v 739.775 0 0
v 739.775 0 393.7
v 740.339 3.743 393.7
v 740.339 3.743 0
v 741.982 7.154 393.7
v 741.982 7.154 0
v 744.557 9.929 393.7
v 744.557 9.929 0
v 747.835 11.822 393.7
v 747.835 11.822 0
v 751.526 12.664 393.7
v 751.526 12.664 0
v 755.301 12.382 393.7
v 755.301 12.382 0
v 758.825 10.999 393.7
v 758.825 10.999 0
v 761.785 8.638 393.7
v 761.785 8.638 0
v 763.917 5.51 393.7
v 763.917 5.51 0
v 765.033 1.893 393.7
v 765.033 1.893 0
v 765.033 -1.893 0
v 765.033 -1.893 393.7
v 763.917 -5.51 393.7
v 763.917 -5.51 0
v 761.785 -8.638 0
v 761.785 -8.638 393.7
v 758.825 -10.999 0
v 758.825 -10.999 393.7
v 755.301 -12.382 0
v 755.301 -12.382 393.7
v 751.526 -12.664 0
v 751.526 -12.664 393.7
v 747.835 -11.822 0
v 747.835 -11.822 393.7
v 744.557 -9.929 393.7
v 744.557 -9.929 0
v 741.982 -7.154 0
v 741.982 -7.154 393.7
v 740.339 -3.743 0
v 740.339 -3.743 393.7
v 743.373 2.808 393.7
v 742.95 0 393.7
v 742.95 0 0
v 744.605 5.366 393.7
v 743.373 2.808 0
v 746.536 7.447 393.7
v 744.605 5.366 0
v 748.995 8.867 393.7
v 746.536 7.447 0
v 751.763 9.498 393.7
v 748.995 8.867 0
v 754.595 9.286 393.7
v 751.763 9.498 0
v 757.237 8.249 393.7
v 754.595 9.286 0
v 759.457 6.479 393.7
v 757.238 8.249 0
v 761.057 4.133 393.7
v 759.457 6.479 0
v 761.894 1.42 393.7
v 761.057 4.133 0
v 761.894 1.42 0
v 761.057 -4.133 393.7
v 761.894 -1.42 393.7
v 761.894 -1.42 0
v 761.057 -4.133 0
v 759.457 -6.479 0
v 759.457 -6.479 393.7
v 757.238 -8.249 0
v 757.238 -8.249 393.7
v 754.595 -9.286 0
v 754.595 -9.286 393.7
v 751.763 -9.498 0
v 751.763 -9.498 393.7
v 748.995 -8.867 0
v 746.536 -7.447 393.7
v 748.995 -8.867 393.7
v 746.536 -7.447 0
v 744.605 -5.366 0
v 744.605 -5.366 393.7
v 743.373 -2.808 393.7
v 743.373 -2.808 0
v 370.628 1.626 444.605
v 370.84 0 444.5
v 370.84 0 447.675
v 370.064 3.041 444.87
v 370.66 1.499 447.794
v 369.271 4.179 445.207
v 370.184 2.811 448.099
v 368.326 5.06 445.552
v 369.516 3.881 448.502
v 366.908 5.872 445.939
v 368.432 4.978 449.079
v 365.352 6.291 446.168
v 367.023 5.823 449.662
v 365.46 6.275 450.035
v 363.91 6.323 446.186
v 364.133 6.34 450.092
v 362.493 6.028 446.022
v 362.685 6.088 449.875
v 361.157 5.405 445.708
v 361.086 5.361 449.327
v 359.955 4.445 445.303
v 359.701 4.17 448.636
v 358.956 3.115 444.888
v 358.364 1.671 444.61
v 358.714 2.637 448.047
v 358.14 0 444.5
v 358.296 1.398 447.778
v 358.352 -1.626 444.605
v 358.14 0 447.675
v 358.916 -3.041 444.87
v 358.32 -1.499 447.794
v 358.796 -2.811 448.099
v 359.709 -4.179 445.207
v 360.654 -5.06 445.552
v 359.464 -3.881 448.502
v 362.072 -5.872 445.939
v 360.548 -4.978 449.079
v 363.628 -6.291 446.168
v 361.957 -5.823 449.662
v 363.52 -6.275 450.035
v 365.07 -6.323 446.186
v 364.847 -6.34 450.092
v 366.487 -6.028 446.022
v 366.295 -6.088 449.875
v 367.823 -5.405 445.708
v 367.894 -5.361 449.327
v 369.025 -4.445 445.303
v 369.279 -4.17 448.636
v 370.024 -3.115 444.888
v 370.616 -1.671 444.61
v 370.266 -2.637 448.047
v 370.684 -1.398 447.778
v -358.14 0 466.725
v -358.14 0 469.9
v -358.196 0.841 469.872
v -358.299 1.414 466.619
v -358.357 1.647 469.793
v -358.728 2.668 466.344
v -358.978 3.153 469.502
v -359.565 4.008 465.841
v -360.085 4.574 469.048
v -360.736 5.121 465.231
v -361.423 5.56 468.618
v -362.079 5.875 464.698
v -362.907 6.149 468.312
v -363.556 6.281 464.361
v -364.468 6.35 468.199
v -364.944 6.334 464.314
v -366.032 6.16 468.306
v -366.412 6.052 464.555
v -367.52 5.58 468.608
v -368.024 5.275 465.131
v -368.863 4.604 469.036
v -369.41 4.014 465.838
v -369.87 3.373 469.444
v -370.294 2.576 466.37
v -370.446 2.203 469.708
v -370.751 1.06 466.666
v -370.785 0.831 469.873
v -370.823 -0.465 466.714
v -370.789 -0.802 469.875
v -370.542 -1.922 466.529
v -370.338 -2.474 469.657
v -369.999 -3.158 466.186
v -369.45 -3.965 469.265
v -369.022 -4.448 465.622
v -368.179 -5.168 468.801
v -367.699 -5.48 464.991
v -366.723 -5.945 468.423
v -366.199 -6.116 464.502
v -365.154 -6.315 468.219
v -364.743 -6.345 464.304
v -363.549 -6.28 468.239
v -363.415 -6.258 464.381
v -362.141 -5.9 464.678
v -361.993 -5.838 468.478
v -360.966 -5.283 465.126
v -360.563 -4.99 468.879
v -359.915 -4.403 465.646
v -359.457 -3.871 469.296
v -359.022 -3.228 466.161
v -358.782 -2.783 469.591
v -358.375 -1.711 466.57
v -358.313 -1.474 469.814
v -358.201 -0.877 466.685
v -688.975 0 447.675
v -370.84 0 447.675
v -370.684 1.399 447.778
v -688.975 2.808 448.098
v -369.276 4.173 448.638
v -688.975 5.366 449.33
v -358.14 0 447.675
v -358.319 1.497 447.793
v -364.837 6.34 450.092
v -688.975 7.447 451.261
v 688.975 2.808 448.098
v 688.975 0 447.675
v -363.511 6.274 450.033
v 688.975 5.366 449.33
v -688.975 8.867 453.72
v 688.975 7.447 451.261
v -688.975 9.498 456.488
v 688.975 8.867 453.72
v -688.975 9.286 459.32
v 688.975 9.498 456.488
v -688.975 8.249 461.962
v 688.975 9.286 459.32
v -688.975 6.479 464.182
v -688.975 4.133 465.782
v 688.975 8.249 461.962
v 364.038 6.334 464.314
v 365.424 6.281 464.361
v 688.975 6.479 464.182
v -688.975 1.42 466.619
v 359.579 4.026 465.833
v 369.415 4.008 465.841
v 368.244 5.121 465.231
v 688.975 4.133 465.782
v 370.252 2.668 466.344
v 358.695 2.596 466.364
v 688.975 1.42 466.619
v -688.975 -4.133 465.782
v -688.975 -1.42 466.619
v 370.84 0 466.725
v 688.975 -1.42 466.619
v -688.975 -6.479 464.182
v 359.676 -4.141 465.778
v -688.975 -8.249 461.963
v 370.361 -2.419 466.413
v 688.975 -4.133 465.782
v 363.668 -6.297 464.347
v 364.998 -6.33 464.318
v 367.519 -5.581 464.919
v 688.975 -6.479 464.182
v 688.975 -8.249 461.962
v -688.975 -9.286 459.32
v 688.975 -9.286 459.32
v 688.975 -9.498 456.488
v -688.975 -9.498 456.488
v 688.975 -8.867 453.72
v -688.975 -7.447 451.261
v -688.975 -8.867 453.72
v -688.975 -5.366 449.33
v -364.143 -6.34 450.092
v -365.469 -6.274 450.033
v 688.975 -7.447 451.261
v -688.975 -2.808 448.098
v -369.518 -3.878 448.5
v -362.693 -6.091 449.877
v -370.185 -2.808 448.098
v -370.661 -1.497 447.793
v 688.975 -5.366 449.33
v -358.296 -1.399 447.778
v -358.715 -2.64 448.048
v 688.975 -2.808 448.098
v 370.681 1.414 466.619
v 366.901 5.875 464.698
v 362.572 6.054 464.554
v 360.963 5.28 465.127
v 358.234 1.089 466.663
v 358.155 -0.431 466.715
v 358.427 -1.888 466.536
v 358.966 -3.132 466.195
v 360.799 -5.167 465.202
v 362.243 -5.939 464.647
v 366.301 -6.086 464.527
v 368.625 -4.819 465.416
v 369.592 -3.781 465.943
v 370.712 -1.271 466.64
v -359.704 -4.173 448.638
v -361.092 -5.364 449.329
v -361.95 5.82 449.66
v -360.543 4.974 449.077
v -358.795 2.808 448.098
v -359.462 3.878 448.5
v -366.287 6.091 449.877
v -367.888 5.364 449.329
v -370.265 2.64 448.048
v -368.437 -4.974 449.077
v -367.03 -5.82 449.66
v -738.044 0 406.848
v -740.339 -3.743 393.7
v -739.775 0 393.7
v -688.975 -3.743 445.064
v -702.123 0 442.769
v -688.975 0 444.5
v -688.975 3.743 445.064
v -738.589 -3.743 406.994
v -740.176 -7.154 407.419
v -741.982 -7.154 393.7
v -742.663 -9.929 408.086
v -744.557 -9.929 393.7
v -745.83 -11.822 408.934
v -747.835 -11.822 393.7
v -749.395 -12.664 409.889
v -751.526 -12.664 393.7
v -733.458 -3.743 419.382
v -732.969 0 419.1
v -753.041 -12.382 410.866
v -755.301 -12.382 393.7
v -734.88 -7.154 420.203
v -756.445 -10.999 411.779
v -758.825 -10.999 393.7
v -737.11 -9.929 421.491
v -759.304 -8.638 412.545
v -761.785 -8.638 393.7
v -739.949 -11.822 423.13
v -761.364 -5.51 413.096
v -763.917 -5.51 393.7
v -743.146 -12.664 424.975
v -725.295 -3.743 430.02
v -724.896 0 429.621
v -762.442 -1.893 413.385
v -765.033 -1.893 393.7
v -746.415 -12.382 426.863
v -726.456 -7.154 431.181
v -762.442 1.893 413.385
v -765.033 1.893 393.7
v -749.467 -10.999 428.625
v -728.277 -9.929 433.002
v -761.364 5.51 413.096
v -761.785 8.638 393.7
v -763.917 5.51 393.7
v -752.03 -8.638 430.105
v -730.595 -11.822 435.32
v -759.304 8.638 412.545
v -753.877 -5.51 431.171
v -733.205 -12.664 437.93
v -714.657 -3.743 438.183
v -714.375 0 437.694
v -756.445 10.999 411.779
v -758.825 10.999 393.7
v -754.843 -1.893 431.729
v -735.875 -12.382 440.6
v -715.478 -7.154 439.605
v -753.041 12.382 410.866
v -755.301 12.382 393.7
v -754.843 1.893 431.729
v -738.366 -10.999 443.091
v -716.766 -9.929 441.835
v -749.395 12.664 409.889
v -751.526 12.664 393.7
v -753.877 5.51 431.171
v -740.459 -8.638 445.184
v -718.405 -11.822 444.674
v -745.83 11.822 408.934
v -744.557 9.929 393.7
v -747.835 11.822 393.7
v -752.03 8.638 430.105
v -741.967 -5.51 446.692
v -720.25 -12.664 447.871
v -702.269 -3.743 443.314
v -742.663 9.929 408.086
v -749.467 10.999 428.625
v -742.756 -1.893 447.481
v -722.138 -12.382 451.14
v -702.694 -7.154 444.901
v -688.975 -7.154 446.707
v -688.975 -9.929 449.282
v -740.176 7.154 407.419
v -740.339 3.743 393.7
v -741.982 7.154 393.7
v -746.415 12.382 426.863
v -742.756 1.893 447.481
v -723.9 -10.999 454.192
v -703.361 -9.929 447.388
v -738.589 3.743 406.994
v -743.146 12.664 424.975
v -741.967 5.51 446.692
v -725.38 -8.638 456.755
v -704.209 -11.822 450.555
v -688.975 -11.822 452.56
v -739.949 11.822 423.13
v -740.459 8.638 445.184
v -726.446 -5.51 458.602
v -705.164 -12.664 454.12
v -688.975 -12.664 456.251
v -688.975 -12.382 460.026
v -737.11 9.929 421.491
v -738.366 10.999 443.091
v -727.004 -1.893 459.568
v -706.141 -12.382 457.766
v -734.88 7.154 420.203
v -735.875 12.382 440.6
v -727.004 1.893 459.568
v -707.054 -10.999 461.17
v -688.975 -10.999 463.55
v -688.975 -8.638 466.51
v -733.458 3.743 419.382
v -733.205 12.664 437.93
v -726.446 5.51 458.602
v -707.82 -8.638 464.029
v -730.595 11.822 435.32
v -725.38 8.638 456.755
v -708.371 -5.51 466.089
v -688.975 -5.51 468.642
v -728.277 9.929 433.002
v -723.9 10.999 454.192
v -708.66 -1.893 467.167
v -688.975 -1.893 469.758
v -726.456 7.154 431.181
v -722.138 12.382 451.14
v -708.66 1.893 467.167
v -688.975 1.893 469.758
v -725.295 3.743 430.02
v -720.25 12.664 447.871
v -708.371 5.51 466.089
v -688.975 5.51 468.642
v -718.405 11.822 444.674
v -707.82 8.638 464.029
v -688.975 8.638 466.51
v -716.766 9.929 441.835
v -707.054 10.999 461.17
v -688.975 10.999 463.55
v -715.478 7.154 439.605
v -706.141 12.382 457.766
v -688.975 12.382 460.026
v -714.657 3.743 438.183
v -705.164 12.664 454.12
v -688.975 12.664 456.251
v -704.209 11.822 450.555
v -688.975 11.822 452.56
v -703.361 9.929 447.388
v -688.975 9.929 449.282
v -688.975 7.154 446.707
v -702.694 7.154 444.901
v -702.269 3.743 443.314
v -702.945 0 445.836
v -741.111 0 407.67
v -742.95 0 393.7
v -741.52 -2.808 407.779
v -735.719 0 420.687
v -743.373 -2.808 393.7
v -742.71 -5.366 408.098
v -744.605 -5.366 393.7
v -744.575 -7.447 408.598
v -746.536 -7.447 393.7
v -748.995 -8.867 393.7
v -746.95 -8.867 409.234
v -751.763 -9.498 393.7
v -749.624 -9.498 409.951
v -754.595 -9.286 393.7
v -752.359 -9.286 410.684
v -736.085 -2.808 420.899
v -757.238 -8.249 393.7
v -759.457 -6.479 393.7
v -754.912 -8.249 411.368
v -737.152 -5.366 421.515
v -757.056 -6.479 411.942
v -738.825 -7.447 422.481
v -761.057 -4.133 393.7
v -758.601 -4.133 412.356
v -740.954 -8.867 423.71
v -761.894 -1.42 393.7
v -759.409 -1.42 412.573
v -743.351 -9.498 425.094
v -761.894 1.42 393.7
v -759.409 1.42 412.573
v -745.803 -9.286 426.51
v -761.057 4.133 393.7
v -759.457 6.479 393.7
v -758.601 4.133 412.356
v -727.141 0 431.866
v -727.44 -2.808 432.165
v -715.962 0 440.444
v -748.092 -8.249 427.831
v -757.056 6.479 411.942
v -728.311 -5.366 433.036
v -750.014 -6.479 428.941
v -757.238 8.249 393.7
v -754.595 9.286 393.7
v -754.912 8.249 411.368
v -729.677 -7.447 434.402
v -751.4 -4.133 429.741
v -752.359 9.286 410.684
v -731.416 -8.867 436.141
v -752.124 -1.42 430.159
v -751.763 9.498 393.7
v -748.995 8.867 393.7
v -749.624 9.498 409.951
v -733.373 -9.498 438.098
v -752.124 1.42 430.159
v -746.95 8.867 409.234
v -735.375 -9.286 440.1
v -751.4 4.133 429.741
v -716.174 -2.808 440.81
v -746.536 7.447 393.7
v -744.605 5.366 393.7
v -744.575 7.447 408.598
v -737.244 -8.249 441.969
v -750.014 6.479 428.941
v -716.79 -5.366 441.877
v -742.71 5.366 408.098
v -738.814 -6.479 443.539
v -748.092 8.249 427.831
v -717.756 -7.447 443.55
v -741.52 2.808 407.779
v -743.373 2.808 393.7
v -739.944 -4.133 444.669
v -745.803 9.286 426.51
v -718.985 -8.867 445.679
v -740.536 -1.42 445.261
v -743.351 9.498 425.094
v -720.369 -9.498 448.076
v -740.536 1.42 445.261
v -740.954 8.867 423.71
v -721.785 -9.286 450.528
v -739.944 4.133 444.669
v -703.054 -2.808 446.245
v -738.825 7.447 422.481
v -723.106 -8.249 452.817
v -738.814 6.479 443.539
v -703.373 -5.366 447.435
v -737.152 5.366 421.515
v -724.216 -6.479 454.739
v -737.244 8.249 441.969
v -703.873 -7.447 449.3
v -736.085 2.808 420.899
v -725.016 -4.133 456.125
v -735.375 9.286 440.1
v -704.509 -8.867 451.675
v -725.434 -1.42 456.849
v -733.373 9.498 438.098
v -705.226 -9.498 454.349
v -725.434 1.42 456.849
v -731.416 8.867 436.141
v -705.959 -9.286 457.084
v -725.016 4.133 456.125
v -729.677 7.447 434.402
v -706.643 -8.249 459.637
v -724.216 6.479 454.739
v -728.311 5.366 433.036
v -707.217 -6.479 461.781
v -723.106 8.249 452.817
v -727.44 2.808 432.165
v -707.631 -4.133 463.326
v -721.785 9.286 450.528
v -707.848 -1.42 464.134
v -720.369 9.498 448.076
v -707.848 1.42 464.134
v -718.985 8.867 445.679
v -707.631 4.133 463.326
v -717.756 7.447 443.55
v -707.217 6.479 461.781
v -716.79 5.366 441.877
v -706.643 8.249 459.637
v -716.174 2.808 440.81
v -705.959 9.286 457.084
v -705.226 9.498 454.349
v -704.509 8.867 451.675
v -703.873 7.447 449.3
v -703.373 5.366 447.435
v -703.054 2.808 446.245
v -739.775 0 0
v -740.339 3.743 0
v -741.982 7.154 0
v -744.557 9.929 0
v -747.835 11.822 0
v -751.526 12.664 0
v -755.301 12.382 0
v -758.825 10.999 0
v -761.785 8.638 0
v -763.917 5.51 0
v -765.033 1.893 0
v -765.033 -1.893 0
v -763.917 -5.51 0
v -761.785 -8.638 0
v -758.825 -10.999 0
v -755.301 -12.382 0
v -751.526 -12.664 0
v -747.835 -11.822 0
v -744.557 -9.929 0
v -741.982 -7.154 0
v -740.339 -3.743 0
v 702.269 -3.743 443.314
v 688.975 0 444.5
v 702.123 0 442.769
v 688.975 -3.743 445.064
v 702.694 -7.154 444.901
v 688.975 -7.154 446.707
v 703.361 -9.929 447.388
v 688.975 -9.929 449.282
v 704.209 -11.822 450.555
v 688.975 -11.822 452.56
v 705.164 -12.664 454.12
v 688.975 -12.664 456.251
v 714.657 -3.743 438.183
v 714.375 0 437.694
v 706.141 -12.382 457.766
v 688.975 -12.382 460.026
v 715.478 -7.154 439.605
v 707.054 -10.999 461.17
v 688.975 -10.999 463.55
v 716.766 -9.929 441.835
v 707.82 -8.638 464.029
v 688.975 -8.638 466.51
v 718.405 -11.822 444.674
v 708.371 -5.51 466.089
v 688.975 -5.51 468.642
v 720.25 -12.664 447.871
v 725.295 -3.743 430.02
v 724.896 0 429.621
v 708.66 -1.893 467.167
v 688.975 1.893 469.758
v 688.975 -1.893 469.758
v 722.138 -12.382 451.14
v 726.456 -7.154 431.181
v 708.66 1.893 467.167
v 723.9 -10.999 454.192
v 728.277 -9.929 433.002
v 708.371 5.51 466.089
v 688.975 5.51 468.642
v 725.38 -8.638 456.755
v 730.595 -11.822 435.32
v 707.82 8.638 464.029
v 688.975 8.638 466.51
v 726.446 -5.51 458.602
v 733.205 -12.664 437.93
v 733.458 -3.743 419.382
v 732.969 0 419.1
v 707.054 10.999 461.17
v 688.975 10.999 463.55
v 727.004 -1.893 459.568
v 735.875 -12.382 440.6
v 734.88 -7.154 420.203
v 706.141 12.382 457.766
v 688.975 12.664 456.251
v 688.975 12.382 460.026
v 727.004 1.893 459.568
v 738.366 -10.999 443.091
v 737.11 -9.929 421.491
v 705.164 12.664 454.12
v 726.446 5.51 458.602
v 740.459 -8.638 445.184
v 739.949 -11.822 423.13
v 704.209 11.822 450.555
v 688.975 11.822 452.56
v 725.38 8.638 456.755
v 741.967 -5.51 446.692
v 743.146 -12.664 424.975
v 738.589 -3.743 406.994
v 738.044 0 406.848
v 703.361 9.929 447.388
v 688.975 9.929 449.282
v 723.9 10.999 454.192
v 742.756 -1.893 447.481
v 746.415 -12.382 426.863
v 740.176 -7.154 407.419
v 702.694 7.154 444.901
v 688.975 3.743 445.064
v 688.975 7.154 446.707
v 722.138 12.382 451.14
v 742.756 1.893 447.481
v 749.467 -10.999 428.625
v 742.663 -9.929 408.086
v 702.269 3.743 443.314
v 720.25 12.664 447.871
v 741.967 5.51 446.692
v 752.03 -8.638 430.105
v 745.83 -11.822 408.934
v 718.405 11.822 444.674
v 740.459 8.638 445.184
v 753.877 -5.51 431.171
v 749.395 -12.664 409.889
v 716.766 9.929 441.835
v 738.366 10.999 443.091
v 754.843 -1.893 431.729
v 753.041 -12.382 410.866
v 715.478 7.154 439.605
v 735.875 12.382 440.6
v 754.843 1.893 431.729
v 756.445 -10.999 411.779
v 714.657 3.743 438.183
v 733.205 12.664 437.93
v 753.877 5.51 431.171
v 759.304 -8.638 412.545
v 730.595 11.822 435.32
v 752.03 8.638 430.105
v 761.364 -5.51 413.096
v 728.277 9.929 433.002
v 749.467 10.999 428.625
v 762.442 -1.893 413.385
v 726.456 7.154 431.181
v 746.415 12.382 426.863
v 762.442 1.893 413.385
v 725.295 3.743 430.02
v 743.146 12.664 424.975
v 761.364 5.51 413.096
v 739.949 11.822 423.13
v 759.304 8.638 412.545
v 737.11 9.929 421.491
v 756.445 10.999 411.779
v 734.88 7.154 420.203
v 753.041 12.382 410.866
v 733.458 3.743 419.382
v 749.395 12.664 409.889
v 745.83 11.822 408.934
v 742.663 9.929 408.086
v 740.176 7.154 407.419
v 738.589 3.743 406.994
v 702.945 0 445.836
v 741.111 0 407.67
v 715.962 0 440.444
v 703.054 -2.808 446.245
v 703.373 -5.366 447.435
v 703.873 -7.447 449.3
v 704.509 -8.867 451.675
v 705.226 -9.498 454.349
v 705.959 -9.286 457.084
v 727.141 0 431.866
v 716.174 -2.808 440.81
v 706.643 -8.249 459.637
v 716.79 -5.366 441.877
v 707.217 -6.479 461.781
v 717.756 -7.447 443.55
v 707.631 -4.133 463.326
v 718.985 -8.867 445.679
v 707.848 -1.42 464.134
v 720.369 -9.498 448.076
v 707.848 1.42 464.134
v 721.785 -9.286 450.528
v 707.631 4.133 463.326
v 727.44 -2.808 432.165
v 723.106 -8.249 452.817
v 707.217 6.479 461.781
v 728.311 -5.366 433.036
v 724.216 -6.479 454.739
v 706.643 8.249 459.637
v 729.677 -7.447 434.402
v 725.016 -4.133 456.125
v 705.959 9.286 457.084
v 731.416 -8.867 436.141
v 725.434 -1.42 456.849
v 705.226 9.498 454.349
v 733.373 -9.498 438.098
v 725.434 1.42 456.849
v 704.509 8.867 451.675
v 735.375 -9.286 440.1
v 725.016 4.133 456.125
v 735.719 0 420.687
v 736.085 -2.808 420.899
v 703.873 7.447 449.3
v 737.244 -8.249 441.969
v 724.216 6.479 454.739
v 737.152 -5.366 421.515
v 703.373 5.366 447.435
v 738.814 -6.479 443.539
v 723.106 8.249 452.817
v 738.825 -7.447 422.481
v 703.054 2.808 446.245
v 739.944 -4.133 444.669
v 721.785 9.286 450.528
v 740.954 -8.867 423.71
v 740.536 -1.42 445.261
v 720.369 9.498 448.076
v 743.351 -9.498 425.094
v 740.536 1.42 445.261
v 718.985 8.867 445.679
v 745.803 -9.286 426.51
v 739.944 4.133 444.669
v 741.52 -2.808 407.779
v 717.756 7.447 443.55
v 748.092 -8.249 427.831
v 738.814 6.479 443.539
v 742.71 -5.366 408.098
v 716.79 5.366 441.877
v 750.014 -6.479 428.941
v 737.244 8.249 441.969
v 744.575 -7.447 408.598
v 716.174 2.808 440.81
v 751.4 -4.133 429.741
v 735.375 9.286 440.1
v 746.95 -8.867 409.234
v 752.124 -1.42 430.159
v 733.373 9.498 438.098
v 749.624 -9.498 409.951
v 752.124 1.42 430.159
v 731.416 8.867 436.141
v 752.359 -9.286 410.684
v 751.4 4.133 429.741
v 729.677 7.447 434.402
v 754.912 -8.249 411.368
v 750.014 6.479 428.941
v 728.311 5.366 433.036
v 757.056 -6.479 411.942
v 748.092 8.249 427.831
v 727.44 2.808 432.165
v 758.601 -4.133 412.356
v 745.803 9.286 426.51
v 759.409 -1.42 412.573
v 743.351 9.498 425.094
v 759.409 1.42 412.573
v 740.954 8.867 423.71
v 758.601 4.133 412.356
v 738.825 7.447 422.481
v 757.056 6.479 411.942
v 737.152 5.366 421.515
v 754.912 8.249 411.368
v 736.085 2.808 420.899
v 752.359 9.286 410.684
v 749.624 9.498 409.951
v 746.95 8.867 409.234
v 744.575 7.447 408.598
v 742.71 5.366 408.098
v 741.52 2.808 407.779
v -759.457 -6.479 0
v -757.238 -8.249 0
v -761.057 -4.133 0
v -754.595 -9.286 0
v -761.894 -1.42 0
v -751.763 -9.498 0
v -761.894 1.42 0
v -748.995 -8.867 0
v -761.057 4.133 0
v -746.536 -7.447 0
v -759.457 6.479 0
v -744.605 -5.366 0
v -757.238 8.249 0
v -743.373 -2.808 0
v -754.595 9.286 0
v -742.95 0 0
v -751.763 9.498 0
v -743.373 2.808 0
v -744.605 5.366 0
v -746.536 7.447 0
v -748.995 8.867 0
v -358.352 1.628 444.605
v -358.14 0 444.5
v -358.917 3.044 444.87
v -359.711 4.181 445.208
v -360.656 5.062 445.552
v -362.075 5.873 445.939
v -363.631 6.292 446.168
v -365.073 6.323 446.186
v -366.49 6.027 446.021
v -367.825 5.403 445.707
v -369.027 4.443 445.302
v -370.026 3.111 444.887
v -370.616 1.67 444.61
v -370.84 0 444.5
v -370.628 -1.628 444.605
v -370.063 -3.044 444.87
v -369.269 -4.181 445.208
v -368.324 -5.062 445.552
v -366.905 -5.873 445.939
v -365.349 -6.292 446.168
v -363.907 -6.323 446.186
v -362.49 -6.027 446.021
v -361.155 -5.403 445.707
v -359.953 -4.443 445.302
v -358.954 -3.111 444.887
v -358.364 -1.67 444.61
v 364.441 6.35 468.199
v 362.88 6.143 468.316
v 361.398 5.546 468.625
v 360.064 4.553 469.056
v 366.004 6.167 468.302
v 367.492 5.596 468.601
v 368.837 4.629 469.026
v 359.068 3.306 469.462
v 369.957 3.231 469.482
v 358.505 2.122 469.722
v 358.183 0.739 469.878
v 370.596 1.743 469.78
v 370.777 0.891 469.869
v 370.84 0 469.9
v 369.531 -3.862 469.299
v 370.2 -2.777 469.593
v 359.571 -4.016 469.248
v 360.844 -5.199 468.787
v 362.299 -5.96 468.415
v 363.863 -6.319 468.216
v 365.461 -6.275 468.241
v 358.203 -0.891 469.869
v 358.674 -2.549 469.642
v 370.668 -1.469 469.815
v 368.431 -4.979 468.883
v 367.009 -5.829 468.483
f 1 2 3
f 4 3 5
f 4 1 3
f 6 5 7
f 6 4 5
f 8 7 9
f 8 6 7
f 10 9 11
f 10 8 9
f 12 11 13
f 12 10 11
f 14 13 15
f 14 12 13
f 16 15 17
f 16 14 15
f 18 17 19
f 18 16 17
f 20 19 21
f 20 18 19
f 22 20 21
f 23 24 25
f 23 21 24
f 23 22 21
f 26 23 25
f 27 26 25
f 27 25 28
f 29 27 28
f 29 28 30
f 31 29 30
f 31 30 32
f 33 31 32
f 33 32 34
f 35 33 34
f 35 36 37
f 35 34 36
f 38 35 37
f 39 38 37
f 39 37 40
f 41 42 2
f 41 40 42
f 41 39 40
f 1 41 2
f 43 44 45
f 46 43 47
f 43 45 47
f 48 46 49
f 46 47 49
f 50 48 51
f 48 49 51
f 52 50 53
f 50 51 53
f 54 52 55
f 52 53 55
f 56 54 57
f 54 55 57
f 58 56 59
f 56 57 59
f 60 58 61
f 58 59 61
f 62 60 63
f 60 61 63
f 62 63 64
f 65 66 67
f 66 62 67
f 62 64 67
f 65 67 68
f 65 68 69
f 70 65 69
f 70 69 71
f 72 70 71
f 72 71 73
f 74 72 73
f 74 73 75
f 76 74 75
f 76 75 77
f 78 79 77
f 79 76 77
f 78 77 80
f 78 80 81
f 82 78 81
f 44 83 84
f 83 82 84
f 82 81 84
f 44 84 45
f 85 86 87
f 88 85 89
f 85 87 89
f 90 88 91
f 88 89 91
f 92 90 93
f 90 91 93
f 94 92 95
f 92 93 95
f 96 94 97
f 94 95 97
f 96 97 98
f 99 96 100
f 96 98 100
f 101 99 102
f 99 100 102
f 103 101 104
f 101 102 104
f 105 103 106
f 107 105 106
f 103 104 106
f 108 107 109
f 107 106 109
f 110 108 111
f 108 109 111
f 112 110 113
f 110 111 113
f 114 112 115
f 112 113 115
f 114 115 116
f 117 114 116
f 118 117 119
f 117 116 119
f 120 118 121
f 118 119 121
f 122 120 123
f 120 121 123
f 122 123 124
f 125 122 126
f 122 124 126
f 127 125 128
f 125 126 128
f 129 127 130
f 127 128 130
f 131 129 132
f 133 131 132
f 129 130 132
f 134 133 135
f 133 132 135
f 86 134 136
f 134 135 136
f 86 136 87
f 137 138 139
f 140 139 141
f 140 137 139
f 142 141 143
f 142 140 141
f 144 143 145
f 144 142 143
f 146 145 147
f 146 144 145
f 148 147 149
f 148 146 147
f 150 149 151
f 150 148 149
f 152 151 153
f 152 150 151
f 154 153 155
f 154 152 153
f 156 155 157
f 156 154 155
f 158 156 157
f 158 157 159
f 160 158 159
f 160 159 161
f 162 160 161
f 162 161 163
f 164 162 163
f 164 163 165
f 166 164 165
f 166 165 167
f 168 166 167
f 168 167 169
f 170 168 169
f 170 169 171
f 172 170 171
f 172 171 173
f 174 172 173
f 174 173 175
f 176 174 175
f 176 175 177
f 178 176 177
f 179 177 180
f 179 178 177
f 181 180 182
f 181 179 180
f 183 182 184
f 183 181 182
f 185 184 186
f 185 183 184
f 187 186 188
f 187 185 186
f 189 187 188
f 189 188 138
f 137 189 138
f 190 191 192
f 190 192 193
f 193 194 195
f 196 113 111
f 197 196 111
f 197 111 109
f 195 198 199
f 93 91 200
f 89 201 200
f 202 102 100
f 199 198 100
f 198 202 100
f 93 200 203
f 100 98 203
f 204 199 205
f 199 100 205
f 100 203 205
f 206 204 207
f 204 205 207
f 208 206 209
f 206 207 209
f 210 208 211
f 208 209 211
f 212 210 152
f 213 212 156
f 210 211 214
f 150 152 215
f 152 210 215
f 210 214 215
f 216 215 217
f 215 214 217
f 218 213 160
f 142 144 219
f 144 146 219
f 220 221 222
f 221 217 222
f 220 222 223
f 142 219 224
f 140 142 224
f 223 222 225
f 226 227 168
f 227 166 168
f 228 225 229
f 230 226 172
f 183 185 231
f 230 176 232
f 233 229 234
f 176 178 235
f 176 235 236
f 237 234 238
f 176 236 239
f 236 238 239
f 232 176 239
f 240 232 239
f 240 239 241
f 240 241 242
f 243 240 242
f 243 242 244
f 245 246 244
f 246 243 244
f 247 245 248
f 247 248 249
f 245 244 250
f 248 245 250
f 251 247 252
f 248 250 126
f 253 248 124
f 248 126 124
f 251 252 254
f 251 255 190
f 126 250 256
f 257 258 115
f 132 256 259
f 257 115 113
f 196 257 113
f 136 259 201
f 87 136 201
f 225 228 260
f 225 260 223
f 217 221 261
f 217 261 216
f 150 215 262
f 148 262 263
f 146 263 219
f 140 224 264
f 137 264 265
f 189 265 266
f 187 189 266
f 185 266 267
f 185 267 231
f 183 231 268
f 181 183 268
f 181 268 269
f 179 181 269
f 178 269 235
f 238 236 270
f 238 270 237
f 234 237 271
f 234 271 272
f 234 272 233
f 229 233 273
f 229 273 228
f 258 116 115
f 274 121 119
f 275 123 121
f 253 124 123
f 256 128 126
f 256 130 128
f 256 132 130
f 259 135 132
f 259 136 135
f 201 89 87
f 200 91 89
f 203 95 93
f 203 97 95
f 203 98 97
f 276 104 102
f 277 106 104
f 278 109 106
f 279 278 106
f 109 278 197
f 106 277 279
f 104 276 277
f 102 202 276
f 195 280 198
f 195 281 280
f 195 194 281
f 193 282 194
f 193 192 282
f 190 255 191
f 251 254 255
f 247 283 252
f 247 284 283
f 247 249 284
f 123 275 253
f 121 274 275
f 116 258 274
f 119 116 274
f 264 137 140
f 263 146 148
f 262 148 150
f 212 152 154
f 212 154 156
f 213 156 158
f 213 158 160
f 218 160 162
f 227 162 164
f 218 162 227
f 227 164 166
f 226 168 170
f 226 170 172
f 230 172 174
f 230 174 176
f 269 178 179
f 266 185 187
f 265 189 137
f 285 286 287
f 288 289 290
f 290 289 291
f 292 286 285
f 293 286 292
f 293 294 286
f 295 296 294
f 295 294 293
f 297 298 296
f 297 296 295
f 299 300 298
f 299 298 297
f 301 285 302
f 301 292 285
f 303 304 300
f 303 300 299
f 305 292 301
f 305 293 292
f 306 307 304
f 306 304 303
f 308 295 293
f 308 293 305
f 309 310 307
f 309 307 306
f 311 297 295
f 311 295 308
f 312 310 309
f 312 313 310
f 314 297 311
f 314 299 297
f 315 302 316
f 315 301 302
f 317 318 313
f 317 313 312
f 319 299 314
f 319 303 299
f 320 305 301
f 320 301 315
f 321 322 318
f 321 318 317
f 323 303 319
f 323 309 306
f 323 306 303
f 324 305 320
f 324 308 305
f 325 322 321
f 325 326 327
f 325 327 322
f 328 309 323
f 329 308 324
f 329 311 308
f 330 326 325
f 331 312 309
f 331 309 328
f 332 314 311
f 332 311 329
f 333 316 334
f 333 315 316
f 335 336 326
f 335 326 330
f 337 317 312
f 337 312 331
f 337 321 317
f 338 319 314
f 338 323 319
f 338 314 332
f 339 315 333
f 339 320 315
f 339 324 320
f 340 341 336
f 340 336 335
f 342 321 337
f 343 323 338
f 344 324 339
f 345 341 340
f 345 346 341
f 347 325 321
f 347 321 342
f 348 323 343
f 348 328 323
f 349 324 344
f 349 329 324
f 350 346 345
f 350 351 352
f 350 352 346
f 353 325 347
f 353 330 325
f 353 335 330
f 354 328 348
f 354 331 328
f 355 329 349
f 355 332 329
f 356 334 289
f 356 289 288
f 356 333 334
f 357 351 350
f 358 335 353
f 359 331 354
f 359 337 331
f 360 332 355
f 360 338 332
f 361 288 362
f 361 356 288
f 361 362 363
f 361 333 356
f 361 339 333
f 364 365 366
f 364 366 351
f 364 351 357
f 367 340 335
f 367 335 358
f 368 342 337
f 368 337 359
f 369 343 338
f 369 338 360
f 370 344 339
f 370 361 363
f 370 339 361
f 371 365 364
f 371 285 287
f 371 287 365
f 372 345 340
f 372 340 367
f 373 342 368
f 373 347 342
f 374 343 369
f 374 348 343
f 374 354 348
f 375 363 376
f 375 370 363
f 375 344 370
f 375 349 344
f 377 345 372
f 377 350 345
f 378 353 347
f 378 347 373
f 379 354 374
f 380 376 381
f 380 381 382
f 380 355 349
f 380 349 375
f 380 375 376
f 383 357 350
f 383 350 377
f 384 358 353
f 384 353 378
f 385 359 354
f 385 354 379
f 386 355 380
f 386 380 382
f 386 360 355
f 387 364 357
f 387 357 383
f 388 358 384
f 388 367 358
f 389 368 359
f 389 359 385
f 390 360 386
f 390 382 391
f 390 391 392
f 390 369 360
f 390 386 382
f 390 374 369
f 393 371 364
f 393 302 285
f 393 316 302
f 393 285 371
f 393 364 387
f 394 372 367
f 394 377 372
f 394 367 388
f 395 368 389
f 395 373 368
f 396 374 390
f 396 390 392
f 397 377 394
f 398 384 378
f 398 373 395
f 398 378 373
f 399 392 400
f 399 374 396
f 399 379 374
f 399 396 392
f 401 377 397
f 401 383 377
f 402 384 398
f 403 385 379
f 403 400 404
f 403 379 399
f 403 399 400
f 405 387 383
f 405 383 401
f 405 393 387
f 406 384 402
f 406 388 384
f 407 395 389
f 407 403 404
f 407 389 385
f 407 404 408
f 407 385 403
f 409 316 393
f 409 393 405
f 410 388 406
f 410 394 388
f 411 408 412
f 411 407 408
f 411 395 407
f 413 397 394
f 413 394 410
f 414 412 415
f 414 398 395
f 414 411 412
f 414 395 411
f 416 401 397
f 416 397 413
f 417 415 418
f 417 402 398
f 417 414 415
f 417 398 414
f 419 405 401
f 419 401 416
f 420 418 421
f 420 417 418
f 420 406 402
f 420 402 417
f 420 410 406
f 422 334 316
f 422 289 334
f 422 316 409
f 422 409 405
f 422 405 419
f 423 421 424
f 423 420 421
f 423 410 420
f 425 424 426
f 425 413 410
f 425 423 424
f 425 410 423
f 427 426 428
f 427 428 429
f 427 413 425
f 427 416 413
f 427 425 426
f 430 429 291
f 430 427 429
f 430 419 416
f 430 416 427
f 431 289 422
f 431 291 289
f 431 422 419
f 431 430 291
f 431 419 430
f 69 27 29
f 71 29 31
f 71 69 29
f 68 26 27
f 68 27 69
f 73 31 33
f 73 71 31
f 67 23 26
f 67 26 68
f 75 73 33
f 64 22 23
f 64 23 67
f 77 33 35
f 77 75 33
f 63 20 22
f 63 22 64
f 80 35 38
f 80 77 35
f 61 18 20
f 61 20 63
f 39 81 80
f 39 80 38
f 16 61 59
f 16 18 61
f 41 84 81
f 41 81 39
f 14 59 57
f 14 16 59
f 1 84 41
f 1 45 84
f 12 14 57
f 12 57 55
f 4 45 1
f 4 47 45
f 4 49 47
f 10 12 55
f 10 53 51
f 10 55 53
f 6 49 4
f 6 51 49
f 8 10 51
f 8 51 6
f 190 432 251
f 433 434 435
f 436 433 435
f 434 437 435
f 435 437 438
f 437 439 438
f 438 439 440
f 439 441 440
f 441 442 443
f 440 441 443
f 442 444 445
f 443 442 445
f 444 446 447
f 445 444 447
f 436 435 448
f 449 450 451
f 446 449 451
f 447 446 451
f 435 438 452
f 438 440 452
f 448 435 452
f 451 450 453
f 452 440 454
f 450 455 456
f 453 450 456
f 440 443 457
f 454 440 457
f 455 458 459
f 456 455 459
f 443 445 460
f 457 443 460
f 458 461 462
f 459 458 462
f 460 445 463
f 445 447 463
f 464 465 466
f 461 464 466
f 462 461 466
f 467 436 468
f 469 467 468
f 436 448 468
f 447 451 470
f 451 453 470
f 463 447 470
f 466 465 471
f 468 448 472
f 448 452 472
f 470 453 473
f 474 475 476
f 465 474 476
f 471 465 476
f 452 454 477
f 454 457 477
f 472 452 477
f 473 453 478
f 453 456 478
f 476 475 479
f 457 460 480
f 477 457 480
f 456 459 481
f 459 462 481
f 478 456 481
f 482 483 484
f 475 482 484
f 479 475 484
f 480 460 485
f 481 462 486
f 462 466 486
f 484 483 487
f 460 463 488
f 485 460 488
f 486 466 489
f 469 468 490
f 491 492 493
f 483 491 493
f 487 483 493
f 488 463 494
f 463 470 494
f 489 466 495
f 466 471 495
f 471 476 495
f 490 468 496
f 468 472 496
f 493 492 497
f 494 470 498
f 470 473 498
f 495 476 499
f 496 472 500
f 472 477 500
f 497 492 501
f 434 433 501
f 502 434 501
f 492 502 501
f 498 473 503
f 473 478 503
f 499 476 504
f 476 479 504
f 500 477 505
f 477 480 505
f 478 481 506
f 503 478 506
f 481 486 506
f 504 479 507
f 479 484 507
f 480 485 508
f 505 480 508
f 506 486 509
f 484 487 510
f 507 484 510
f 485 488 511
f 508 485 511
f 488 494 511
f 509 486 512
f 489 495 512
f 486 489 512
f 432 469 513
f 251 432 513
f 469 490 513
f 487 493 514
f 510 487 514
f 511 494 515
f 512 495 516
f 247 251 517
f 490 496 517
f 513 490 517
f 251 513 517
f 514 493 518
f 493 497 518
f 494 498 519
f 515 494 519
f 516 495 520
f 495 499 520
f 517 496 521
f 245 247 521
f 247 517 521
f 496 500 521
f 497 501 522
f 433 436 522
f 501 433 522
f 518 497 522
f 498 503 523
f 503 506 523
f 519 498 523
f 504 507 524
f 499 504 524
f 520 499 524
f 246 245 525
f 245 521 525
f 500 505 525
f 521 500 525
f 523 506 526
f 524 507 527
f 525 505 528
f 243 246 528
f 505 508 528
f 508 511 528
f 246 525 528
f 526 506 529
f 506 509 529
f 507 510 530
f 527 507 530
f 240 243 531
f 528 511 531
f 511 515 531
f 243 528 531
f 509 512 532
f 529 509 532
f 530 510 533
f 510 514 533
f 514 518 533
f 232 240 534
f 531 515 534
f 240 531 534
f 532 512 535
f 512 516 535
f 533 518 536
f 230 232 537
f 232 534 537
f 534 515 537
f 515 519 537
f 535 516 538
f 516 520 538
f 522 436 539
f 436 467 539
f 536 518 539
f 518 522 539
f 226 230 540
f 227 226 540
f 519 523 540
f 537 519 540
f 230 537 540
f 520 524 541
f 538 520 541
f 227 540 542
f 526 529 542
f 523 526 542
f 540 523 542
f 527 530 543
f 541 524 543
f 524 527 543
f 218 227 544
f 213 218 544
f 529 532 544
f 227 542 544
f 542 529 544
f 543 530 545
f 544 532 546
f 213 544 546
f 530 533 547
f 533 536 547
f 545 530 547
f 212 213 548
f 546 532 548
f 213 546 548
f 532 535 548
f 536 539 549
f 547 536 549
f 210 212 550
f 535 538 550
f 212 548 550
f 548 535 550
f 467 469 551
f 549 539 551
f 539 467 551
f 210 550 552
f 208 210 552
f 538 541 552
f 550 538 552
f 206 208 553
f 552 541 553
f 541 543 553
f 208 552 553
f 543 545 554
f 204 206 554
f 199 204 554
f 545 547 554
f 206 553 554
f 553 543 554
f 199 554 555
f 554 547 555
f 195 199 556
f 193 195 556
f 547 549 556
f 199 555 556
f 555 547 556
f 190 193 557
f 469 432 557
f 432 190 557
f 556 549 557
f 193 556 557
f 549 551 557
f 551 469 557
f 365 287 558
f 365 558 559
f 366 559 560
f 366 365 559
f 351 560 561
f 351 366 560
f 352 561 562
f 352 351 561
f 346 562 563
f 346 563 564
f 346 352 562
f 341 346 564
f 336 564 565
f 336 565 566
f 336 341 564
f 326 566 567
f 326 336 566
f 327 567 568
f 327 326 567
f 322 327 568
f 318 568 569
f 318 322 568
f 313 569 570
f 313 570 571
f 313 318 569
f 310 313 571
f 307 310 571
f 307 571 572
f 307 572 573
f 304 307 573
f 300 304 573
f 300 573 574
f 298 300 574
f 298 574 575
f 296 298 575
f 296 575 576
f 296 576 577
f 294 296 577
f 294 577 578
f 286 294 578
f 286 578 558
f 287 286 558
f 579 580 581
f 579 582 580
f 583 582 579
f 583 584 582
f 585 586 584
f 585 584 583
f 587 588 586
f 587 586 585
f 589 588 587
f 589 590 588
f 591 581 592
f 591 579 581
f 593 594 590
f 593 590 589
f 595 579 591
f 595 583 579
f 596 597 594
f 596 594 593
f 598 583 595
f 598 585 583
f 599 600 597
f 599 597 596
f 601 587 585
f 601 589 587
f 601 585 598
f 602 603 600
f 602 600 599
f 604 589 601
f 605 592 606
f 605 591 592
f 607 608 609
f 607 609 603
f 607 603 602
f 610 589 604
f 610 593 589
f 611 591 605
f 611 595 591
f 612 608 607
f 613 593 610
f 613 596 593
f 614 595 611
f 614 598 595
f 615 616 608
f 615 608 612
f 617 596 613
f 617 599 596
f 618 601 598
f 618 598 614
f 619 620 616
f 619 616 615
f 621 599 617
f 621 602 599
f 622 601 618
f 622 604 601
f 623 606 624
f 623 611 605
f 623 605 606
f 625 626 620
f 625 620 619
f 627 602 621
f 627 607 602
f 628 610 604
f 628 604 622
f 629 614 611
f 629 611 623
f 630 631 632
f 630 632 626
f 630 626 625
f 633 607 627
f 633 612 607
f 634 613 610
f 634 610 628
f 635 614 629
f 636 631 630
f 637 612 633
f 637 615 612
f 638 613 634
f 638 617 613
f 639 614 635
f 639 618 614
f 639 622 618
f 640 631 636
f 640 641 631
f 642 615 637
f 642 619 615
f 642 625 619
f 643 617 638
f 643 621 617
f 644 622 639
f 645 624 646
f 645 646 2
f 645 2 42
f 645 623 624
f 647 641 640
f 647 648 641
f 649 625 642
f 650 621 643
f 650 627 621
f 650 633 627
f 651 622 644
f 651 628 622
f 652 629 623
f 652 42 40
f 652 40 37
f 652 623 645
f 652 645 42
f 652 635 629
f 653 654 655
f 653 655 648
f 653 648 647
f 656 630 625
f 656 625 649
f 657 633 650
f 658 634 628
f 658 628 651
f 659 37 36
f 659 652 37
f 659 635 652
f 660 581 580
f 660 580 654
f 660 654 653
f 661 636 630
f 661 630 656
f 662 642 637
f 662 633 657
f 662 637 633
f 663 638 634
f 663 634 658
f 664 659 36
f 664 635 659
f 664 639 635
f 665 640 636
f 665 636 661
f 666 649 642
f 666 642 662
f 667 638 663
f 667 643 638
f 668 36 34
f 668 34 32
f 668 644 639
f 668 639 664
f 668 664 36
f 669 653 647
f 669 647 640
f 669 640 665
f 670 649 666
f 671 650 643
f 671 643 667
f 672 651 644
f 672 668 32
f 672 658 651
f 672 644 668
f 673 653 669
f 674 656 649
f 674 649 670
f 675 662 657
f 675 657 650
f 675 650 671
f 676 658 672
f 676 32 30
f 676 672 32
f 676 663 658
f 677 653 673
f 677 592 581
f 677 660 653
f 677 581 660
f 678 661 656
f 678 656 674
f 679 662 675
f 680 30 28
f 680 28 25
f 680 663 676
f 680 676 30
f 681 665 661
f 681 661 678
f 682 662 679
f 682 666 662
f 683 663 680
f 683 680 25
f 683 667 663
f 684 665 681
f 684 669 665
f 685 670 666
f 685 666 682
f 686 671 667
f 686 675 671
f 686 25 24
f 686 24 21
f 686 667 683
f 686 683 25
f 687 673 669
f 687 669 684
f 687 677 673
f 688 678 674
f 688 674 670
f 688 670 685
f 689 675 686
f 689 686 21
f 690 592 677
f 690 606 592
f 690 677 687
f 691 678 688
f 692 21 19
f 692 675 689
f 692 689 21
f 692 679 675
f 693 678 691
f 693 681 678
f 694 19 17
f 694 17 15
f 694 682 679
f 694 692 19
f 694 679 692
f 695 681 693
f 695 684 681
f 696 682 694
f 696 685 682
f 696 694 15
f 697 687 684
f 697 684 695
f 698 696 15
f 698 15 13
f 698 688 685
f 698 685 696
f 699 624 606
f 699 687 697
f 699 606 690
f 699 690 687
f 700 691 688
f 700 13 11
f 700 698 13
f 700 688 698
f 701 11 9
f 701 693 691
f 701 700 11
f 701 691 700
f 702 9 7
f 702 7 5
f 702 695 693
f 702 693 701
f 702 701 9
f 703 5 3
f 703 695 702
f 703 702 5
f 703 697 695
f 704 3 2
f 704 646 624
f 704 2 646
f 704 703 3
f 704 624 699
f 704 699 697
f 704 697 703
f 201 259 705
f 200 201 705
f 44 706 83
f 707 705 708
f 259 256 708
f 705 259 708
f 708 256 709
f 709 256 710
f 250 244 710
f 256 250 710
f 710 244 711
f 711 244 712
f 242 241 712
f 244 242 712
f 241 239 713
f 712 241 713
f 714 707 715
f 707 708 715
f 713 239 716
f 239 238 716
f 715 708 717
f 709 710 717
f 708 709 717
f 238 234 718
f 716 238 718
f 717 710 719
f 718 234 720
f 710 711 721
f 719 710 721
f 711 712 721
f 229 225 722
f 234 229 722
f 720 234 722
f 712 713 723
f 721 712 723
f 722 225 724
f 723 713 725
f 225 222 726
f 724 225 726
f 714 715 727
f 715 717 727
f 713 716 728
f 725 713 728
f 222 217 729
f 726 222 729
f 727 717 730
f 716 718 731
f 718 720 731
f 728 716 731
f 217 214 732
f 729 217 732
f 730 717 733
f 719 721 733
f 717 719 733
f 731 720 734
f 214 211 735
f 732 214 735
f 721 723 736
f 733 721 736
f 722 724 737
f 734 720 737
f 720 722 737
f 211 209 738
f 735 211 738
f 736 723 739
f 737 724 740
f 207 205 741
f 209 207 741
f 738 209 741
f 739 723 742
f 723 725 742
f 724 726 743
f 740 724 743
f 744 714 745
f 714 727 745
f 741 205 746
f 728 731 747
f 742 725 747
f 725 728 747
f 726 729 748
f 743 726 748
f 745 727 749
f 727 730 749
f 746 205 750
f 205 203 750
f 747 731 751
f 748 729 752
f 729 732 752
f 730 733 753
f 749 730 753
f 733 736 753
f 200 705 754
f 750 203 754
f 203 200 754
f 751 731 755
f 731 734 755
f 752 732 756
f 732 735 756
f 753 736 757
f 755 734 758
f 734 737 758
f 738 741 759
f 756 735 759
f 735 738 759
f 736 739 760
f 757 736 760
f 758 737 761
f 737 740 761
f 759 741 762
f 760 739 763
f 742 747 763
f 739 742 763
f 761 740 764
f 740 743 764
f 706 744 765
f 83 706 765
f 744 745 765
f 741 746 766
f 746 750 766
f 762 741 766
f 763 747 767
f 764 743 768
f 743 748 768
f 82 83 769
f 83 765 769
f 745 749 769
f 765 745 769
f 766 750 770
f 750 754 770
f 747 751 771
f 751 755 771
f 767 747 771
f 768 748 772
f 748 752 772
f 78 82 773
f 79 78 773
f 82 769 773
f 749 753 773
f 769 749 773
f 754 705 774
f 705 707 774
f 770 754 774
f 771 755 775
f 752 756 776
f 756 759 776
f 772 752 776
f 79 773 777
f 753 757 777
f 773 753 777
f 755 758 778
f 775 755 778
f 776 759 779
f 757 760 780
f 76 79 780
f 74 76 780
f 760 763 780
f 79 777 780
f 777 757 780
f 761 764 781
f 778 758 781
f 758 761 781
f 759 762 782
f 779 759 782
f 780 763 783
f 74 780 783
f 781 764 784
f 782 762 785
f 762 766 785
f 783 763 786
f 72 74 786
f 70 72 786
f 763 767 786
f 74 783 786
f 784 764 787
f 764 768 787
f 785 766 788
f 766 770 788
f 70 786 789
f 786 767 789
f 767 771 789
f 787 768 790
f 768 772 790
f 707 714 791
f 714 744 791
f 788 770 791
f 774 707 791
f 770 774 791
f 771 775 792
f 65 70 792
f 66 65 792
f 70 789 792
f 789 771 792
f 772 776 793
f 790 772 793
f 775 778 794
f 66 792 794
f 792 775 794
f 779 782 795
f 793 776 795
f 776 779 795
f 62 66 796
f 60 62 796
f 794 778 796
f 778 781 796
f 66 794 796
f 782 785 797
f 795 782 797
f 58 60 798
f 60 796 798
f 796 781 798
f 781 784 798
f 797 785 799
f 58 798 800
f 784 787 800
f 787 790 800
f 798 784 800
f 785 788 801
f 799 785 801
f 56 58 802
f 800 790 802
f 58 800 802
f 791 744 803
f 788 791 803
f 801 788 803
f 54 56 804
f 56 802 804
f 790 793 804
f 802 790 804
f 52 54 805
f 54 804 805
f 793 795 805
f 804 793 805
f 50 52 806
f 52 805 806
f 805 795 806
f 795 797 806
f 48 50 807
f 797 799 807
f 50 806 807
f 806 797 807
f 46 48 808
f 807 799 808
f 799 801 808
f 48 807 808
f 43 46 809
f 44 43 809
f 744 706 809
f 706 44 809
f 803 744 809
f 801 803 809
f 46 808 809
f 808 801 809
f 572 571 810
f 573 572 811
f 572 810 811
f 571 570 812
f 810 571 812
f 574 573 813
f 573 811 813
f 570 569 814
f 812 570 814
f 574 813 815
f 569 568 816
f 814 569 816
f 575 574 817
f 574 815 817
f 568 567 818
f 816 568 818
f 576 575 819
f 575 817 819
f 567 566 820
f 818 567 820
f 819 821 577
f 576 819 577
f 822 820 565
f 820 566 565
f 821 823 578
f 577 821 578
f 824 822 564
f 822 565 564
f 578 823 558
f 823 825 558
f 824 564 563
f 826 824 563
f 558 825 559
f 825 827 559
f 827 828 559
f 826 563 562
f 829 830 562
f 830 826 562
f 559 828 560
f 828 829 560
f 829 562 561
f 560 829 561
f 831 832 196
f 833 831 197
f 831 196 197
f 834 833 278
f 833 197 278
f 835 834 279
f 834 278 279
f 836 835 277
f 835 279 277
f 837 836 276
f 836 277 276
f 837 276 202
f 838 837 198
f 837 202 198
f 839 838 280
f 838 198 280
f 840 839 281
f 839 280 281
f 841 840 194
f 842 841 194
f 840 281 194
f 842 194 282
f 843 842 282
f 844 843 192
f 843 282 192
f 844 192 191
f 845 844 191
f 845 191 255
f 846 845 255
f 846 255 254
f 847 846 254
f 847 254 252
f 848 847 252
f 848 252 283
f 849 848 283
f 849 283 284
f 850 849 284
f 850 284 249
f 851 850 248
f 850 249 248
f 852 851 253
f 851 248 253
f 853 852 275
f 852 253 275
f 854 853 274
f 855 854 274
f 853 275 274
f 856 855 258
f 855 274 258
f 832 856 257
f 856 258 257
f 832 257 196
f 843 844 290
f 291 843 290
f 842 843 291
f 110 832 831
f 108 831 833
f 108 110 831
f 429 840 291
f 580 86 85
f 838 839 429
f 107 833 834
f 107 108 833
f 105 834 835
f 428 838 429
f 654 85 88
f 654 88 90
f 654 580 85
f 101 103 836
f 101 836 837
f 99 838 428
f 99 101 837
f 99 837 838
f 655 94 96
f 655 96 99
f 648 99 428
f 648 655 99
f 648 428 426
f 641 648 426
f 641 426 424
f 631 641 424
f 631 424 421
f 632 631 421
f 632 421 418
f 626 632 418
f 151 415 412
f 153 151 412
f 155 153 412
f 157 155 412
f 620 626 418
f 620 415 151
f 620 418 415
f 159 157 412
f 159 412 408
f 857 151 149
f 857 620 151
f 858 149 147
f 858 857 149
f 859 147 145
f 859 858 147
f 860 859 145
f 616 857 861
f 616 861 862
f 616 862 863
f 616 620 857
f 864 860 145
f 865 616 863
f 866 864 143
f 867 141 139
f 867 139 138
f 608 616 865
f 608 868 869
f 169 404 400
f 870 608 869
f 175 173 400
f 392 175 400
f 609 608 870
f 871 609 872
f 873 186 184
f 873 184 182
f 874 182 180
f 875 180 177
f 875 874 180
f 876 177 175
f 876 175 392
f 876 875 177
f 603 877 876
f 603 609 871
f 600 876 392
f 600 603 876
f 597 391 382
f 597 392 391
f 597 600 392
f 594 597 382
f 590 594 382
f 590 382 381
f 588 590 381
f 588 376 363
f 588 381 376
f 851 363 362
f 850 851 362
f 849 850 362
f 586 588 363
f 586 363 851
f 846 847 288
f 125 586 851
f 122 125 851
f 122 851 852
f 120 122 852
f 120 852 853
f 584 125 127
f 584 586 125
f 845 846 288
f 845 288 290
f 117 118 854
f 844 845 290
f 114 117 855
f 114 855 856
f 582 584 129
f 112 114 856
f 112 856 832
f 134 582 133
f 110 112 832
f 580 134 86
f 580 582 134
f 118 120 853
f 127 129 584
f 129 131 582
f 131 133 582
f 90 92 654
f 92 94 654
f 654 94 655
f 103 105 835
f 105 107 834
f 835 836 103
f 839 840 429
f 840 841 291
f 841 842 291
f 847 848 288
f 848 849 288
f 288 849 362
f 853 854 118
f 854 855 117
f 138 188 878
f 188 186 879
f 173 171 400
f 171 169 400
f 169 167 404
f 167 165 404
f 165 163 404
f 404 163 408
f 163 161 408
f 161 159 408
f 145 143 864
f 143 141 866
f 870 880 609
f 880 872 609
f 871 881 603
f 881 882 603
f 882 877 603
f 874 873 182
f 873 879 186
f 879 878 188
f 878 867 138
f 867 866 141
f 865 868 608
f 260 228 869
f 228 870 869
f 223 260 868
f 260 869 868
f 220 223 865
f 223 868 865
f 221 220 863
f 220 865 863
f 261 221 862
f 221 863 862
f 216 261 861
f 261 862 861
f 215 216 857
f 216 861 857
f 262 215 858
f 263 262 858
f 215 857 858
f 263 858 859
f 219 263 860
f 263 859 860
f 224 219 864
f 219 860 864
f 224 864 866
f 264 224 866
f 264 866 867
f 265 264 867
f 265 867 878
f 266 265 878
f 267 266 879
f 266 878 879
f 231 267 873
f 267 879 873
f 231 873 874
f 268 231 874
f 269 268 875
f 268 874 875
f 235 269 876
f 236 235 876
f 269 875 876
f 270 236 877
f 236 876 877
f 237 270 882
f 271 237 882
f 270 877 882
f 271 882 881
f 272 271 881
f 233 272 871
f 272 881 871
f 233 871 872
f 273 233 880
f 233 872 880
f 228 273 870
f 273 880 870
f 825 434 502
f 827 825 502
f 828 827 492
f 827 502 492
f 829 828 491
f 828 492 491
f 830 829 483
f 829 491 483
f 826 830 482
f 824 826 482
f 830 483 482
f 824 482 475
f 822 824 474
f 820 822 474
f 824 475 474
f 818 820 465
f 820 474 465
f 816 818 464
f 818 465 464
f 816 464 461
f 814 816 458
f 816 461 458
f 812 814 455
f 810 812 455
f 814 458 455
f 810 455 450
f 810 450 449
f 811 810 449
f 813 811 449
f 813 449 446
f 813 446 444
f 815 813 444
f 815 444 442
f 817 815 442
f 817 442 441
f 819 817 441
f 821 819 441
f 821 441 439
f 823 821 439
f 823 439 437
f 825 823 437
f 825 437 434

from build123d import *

# Parameters (mm, degrees)
F1_R     = 12.7
F1_R_2   = 9.525
F4_R     = 6.35
F5_DEPTH = 12.7


with BuildPart() as f2:
    # F2: sweep along a path in F0
    with BuildLine(Plane.XZ) as f2_path:
        Line((-752.475, 0), (-752.475, 393.7))
        ThreePointArc((-752.475, 393.7), (-733.8762806053, 438.6012806053), (-688.975, 457.2))
        Line((-688.975, 457.2), (688.975, 457.2))
        ThreePointArc((688.975, 457.2), (733.8762806053, 438.6012806053), (752.475, 393.7))
        Line((752.475, 393.7), (752.475, 0))
    # F1 (on Top) → F2 (sweep)
    with BuildSketch(Plane.XY):
        with Locations((-752.475, 0)):
            Circle(F1_R)
        with Locations((-752.475, 0)):
            Circle(F1_R_2, mode=Mode.SUBTRACT)
    sweep(path=f2_path.line)

    # F4 (on offset) → F5 (cut, symmetric)
    with BuildSketch(Plane.XY.offset(457.2)):
        with Locations((-364.49, 0)):
            Circle(F4_R)
        with Locations((364.49, 0)):
            Circle(F4_R)
    extrude(amount=F5_DEPTH, both=True, mode=Mode.SUBTRACT)


solid = f2.part
